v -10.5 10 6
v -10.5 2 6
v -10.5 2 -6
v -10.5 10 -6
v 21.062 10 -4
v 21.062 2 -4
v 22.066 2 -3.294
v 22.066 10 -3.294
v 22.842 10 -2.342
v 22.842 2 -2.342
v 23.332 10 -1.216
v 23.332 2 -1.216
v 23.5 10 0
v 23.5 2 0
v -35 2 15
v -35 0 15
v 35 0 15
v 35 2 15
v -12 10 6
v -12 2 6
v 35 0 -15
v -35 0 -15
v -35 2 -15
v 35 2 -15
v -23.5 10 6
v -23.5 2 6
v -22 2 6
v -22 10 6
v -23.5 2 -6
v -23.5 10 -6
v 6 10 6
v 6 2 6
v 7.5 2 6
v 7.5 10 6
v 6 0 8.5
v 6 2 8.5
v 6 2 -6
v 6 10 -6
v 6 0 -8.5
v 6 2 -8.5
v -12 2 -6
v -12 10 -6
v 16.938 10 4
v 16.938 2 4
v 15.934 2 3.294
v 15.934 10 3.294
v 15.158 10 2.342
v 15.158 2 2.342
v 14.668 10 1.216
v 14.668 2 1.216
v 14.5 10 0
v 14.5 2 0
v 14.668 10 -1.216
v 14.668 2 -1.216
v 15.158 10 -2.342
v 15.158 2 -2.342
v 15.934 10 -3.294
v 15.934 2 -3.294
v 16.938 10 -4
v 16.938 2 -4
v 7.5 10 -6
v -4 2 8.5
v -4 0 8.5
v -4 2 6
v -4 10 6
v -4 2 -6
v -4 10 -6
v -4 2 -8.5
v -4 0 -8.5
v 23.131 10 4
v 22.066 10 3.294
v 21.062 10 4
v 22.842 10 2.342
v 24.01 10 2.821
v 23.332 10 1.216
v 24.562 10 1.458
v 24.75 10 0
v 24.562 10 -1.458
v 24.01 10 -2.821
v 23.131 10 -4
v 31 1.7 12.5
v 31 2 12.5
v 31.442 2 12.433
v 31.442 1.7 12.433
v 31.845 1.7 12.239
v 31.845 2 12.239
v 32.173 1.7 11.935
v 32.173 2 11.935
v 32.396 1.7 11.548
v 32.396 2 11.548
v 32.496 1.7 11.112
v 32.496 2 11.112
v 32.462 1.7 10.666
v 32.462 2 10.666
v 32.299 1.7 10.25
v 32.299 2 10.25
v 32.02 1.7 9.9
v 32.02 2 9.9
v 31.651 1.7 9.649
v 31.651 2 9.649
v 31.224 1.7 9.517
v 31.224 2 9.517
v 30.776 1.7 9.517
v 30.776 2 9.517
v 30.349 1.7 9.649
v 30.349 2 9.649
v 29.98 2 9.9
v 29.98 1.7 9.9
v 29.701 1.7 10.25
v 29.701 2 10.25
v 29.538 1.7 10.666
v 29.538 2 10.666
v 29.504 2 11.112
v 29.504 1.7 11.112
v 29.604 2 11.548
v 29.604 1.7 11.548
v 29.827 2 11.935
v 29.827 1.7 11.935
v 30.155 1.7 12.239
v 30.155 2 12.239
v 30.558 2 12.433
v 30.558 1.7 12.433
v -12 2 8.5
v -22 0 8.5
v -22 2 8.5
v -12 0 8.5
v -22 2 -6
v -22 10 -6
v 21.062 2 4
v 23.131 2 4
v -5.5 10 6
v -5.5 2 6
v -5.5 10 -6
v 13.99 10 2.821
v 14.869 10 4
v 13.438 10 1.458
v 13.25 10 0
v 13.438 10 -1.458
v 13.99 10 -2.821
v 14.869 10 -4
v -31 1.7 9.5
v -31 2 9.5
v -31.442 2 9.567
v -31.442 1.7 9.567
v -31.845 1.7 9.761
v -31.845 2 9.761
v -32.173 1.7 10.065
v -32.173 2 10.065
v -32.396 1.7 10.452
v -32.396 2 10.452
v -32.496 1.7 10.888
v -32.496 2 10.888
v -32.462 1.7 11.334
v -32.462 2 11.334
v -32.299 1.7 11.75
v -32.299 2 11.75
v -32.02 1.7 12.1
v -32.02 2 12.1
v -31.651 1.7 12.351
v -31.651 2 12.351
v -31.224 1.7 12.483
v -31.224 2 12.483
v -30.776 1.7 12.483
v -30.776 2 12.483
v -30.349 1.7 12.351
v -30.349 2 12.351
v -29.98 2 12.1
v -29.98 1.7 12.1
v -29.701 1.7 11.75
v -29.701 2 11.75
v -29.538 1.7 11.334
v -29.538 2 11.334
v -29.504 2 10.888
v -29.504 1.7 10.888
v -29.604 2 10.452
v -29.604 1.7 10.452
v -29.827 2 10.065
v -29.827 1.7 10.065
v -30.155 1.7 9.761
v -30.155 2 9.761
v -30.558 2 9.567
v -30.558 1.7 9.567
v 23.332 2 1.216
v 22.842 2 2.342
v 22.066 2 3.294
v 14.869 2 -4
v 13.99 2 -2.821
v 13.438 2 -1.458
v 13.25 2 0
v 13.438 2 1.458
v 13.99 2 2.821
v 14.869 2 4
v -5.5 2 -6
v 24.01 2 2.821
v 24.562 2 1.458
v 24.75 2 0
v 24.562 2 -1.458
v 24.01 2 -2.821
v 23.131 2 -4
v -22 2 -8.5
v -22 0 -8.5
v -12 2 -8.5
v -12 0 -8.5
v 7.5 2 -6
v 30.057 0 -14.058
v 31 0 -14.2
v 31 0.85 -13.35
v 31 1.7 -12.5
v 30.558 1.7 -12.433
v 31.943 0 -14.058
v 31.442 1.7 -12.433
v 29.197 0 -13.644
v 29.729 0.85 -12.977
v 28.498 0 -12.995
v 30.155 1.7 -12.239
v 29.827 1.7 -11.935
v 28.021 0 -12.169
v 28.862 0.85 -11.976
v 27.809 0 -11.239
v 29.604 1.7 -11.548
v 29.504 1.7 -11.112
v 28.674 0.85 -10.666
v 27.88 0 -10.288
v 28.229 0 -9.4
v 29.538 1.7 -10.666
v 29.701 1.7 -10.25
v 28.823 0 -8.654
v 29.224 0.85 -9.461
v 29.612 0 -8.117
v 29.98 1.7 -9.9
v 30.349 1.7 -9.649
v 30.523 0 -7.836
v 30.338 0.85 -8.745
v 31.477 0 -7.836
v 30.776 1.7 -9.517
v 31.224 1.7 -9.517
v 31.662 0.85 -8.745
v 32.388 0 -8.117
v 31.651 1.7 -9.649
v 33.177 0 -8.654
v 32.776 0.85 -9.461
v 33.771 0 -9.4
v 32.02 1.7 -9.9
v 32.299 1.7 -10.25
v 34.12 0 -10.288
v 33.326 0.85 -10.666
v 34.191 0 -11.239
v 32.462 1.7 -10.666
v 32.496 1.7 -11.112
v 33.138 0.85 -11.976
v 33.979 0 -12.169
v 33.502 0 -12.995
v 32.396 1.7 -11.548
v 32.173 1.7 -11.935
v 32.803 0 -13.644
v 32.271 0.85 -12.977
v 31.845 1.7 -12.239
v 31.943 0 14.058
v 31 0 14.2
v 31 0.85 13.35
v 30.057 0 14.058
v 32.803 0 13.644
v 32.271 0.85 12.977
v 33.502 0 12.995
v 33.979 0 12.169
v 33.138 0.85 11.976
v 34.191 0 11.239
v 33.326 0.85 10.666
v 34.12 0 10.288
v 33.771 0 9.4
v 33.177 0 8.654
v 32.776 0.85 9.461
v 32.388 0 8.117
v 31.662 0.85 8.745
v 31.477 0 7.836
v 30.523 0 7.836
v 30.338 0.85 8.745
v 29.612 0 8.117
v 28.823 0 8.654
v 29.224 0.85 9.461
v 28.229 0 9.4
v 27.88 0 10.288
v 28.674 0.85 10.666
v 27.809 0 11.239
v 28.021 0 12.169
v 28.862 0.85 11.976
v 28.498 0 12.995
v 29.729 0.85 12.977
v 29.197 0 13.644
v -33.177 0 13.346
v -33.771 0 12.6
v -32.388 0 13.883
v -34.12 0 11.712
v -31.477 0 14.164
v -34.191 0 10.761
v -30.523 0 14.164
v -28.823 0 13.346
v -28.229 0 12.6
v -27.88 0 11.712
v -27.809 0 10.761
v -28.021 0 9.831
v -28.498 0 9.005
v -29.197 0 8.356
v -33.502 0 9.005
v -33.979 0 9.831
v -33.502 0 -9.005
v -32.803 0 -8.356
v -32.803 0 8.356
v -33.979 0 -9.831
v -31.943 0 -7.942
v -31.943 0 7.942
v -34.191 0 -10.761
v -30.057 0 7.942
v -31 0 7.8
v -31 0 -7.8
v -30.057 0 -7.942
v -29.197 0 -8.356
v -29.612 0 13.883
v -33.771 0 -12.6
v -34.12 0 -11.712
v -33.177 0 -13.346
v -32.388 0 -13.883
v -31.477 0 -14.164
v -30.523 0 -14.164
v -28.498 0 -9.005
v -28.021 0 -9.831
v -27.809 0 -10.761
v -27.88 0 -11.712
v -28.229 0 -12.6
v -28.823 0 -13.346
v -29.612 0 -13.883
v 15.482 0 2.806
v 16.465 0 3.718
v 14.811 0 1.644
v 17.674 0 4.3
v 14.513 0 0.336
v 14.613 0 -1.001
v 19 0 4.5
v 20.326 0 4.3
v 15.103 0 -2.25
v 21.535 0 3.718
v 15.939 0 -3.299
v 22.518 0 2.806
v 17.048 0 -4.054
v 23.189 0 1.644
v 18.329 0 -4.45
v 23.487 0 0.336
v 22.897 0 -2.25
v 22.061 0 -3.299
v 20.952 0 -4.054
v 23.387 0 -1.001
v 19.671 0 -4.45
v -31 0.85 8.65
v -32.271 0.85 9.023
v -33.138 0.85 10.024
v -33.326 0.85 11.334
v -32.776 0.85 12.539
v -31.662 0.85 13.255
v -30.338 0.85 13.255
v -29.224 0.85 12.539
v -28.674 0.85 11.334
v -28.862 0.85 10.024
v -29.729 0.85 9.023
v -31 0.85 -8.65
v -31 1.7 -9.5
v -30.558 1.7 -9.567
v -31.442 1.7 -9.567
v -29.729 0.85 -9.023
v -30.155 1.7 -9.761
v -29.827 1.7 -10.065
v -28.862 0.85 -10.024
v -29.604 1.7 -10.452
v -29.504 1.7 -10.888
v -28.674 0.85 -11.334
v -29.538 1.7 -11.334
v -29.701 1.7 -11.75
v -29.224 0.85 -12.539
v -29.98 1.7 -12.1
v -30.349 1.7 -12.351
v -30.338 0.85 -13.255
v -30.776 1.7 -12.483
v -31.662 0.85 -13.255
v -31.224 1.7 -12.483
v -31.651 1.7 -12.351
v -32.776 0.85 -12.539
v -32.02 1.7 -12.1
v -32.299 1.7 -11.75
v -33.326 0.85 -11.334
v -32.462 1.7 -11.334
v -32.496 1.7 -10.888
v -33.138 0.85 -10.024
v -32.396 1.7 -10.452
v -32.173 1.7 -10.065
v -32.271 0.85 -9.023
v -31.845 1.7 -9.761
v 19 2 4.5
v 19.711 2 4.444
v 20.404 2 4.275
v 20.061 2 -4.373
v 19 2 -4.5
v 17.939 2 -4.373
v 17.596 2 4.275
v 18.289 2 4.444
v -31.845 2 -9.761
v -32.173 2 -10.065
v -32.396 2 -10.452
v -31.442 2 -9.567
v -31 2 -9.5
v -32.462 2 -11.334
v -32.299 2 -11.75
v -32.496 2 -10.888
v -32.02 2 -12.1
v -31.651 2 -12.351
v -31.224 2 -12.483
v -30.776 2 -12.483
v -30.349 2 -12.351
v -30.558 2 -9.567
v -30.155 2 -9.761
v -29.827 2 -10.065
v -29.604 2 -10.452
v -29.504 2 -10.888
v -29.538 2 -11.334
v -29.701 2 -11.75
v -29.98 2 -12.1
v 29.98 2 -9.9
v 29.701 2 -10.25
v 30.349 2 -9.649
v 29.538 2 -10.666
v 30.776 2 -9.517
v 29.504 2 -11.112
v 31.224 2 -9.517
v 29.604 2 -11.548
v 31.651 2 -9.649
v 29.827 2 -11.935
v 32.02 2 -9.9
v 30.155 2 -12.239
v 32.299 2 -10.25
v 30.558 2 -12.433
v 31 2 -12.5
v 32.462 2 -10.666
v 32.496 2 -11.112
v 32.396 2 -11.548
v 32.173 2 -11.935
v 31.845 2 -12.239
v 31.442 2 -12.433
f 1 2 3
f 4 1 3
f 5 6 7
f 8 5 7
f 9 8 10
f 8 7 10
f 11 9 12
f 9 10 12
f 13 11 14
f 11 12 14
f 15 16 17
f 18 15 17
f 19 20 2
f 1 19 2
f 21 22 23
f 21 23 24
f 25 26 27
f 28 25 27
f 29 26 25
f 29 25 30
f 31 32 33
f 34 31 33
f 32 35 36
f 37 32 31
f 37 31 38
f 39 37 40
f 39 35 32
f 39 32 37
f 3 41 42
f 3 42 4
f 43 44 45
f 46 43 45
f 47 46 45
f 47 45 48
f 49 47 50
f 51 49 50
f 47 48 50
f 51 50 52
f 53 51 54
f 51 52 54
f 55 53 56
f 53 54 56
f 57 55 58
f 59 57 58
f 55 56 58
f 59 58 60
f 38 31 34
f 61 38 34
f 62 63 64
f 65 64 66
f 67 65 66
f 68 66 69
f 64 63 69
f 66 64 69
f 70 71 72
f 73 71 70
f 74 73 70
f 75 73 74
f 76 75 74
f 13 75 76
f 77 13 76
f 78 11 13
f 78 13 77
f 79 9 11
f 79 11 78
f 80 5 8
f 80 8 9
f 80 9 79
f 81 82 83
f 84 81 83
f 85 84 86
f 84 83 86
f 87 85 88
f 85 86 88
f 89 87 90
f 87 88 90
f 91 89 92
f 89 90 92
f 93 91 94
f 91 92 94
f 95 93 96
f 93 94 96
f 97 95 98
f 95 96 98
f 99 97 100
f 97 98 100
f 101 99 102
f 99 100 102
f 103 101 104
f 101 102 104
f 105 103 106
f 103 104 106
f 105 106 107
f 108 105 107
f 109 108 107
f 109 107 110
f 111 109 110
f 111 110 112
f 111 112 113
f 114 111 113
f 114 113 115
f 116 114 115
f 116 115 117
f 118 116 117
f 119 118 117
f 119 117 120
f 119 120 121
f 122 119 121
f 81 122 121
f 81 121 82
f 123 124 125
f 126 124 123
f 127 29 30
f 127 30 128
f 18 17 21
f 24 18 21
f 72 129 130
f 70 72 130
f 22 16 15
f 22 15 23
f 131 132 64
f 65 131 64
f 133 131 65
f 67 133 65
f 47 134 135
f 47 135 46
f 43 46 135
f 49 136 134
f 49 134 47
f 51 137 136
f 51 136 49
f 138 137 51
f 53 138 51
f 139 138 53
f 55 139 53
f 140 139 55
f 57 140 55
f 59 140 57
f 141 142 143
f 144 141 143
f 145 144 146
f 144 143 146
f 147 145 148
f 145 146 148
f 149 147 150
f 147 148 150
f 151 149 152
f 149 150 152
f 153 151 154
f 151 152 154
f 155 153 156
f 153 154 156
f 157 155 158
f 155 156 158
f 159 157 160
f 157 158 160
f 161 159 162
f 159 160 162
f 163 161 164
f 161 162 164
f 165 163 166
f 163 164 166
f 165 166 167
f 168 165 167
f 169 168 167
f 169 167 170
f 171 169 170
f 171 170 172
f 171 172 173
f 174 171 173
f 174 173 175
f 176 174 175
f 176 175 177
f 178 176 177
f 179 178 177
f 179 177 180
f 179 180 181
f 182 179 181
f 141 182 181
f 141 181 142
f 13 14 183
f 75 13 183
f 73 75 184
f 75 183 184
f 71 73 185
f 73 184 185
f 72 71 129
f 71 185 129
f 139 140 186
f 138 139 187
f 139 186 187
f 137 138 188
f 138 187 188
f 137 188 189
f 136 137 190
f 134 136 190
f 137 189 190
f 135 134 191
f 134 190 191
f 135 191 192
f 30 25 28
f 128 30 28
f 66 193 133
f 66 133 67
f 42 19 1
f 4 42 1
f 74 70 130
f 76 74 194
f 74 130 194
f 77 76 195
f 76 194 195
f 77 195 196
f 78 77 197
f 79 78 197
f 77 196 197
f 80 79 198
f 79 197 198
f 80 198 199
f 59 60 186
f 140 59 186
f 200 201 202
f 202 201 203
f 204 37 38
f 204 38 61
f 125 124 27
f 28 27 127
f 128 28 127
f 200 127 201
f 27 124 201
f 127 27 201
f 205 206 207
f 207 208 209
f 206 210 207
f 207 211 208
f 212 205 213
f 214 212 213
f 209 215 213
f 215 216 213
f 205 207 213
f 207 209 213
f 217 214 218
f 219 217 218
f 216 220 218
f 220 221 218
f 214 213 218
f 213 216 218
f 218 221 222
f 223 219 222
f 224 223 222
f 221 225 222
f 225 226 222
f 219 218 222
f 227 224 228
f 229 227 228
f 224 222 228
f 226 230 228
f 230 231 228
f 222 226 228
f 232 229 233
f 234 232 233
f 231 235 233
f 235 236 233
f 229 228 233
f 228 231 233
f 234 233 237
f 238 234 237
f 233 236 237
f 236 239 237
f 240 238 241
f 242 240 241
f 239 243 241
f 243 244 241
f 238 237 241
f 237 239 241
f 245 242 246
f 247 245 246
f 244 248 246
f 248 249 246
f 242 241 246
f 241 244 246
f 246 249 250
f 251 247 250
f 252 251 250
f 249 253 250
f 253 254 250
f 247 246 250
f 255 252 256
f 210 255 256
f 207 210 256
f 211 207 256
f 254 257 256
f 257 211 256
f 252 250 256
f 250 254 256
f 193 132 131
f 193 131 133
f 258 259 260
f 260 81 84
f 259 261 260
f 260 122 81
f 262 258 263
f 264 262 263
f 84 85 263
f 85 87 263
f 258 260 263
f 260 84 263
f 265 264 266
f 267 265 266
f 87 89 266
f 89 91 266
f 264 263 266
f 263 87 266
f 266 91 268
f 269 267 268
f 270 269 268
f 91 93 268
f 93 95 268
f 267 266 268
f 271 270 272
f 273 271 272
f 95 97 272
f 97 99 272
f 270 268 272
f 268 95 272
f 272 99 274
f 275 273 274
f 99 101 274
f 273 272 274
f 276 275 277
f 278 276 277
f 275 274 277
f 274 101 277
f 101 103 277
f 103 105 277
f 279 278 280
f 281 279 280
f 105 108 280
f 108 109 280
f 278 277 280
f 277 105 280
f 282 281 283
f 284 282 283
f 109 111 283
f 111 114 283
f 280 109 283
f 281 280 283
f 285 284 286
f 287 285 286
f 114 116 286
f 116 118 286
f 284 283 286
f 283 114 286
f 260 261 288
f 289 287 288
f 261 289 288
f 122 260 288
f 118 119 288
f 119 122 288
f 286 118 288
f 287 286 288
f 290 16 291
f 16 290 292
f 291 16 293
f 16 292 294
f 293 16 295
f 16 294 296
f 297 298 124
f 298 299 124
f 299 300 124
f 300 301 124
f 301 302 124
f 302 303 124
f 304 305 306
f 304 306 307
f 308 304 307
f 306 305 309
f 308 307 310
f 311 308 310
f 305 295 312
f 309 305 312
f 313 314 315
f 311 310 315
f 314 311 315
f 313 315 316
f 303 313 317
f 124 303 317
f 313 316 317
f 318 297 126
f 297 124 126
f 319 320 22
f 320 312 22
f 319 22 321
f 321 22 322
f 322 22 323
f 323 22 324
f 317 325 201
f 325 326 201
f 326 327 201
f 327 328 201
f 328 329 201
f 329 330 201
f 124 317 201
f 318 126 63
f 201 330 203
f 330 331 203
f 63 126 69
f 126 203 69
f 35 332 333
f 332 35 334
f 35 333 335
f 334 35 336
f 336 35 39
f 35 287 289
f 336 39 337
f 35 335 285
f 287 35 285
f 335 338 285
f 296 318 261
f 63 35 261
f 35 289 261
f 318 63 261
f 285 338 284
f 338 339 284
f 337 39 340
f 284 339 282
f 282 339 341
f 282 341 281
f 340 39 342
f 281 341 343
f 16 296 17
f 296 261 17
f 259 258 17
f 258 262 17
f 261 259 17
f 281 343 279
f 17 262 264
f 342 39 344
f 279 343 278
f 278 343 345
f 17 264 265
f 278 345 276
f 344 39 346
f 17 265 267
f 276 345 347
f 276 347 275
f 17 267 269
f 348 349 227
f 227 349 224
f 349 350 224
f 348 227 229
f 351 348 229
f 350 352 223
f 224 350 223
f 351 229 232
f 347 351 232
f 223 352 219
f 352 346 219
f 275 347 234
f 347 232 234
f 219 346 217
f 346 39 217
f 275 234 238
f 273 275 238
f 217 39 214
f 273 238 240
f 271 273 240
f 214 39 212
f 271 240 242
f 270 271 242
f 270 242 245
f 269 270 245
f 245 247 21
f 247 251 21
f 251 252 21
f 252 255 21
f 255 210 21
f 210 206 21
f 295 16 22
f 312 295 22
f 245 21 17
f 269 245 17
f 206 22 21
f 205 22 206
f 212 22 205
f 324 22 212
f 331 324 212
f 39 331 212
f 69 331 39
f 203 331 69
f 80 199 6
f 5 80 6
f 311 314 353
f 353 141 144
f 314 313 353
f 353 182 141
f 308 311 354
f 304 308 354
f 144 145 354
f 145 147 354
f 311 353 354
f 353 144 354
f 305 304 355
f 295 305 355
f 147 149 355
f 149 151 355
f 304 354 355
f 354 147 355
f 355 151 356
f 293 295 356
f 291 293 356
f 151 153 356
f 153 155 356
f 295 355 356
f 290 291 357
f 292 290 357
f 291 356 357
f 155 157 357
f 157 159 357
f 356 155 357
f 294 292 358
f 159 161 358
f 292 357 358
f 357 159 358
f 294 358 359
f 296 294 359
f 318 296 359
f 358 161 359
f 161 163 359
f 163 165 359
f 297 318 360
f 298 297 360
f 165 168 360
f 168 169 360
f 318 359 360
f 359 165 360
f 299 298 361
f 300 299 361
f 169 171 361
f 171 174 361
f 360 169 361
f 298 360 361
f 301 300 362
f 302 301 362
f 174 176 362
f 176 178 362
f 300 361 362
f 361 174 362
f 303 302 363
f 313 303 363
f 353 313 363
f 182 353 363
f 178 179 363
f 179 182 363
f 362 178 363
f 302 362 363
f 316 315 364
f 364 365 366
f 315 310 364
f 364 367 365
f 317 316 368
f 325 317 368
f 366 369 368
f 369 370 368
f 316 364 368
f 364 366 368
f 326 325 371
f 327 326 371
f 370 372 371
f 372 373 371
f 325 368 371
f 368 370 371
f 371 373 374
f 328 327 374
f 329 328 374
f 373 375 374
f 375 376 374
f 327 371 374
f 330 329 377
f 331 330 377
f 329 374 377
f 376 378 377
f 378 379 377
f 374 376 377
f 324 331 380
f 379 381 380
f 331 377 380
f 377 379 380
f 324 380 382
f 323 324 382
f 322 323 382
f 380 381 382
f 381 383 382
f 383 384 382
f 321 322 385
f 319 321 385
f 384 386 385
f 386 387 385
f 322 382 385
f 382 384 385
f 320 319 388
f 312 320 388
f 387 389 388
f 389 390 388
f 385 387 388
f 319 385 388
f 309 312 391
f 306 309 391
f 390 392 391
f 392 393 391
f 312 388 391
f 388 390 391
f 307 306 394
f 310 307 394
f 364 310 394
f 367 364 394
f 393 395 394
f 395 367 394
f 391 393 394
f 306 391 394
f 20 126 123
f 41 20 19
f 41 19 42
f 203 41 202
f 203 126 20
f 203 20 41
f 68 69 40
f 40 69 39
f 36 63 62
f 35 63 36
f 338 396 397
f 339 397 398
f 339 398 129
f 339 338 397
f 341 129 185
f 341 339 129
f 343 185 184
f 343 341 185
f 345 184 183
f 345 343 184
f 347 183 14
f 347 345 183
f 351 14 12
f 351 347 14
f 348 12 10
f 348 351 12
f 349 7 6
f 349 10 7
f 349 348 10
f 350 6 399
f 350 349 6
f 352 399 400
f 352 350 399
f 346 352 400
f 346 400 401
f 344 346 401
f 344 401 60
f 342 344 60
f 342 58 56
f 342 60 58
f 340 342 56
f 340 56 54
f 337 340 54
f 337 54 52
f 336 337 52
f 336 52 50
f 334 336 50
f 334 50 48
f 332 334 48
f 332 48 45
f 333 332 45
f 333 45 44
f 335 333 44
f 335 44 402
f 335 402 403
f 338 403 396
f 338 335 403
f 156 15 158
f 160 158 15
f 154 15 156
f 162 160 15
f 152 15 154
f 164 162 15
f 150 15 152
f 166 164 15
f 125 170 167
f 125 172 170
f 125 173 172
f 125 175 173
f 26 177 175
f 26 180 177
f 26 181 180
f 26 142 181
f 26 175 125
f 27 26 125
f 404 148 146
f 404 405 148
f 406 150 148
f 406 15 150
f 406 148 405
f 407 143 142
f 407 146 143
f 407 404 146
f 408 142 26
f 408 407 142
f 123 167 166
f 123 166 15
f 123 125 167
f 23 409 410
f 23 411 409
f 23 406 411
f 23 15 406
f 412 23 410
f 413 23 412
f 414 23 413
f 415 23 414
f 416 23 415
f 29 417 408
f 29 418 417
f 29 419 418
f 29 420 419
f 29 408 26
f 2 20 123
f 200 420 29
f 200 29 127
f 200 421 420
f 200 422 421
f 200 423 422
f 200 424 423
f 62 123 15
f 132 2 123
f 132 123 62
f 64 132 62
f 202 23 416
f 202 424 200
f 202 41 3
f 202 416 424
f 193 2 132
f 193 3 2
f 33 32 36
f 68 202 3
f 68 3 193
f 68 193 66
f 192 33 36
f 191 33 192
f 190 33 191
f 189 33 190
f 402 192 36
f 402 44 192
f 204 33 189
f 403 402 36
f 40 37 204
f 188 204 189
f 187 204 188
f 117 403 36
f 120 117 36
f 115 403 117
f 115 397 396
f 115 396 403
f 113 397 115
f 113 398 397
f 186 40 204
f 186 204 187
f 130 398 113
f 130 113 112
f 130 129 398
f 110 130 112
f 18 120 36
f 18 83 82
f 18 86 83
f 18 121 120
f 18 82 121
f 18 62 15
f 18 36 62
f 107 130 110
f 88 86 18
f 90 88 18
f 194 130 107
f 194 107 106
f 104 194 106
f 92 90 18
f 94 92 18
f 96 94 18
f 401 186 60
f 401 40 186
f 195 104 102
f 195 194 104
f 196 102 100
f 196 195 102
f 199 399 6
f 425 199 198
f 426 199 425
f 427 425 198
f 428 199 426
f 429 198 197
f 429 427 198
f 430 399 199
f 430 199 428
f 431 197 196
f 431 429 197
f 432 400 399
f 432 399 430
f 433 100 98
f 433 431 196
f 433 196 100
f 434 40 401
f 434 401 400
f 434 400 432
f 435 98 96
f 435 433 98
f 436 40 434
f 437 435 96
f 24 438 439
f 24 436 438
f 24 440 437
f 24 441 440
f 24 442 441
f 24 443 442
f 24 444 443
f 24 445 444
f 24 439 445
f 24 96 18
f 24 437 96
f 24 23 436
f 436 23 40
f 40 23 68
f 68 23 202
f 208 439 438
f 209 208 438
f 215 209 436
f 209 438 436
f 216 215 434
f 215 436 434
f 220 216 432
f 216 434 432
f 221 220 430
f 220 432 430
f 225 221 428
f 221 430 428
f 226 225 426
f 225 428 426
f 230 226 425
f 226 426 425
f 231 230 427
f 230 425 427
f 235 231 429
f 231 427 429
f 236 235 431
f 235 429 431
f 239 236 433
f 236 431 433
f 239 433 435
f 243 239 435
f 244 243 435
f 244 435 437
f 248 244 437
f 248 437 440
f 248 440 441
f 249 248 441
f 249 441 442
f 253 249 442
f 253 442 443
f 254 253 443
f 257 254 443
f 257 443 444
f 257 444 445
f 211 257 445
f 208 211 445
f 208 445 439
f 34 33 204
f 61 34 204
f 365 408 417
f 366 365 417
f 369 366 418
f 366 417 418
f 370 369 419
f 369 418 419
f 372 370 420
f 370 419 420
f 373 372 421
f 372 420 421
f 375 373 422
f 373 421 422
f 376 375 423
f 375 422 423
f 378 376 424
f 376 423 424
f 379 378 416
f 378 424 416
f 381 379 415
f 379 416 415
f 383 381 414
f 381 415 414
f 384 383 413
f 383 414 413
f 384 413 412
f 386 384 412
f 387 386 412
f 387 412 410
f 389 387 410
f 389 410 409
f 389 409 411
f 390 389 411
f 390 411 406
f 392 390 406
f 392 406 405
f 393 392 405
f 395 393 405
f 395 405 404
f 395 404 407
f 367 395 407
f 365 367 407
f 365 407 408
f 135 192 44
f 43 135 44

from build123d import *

# Parameters (mm, degrees)
SKETCH1_W           = 70
SKETCH1_H           = 30
SKETCH1_R           = 4.5
SKETCH1_W_2         = 10
SKETCH1_H_2         = 17
BOSS_EXTRUDE1_DEPTH = 2
SKETCH2_W           = 1.5
SKETCH2_H           = 12
BOSS_EXTRUDE2_DEPTH = 8
CUT_EXTRUDE1_REACH  = 40.91
SKETCH3_R           = 1.5
CHAMFER1_SIZE       = 1.7


with BuildPart() as part:
    # Sketch1 → Boss-Extrude1 (new body)
    with BuildSketch(Plane(origin=(0, 0, 0), x_dir=(1, 0, 0), z_dir=(0, 1, 0))):
        Rectangle(SKETCH1_W, SKETCH1_H)
        with Locations(Location((19, 0, 0), (0, 0, 270))):
            Circle(SKETCH1_R, mode=Mode.SUBTRACT)
        with Locations((-17, 0)):
            Rectangle(SKETCH1_W_2, SKETCH1_H_2, mode=Mode.SUBTRACT)
        with Locations((1, 0)):
            Rectangle(SKETCH1_W_2, SKETCH1_H_2, mode=Mode.SUBTRACT)
    extrude(amount=BOSS_EXTRUDE1_DEPTH)

    # Sketch2 → Boss-Extrude2 (add)
    with BuildSketch(Plane(origin=(0, 2, 0), x_dir=(1, 0, 0), z_dir=(0, 1, 0))):
        with Locations((-22.75, 0)):
            Rectangle(SKETCH2_W, SKETCH2_H)
        with Locations((-11.25, 0)):
            Rectangle(SKETCH2_W, SKETCH2_H)
        with Locations((-4.75, 0)):
            Rectangle(SKETCH2_W, SKETCH2_H)
        with Locations((6.75, 0)):
            Rectangle(SKETCH2_W, SKETCH2_H)
        with BuildLine():
            Line((16.938447187, 4), (14.86932209, 4))
            ThreePointArc((14.86932209, 4), (13.25, 0), (14.86932209, -4))
            Line((14.86932209, -4), (16.938447187, -4))
            ThreePointArc((16.938447187, -4), (14.5, 0), (16.938447187, 4))
        make_face()
        with BuildLine():
            Line((23.13067791, 4), (21.061552813, 4))
            ThreePointArc((21.061552813, 4), (22.842329219, 2.342329219), (23.5, 0))
            ThreePointArc((23.5, 0), (22.842329219, -2.342329219), (21.061552813, -4))
            Line((21.061552813, -4), (23.13067791, -4))
            ThreePointArc((23.13067791, -4), (24.75, 0), (23.13067791, 4))
        make_face()
    extrude(amount=BOSS_EXTRUDE2_DEPTH)

    # Sketch3 → Cut-Extrude1 (cut, up to next)
    with BuildSketch(Plane(origin=(0, 2, 0), x_dir=(1, 0, 0), z_dir=(0, 1, 0)), mode=Mode.PRIVATE) as cut_extrude1_sk1:
        with Locations(Location((-31, 11, 0), (0, 0, 270))):
            Circle(SKETCH3_R)
    cut_extrude1_tool1 = extrude(cut_extrude1_sk1.sketch, amount=-CUT_EXTRUDE1_REACH, mode=Mode.PRIVATE) & part.part
    # Sketch3 → Cut-Extrude1 (cut, up to next)
    with BuildSketch(Plane(origin=(0, 2, 0), x_dir=(1, 0, 0), z_dir=(0, 1, 0)), mode=Mode.PRIVATE) as cut_extrude1_sk2:
        with Locations(Location((31, 11, 0), (0, 0, 90))):
            Circle(SKETCH3_R)
    cut_extrude1_tool2 = extrude(cut_extrude1_sk2.sketch, amount=-CUT_EXTRUDE1_REACH, mode=Mode.PRIVATE) & part.part
    # Sketch3 → Cut-Extrude1 (cut, up to next)
    with BuildSketch(Plane(origin=(0, 2, 0), x_dir=(1, 0, 0), z_dir=(0, 1, 0)), mode=Mode.PRIVATE) as cut_extrude1_sk3:
        with Locations(Location((31, -11, 0), (0, 0, 270))):
            Circle(SKETCH3_R)
    cut_extrude1_tool3 = extrude(cut_extrude1_sk3.sketch, amount=-CUT_EXTRUDE1_REACH, mode=Mode.PRIVATE) & part.part
    # Sketch3 → Cut-Extrude1 (cut, up to next)
    with BuildSketch(Plane(origin=(0, 2, 0), x_dir=(1, 0, 0), z_dir=(0, 1, 0)), mode=Mode.PRIVATE) as cut_extrude1_sk4:
        with Locations(Location((-31, -11, 0), (0, 0, 90))):
            Circle(SKETCH3_R)
    cut_extrude1_tool4 = extrude(cut_extrude1_sk4.sketch, amount=-CUT_EXTRUDE1_REACH, mode=Mode.PRIVATE) & part.part
    add(cut_extrude1_tool1.solids().sort_by_distance((-31, 2, -11))[0], mode=Mode.SUBTRACT)
    add(cut_extrude1_tool2.solids().sort_by_distance((31, 2, -11))[0], mode=Mode.SUBTRACT)
    add(cut_extrude1_tool3.solids().sort_by_distance((31, 2, 11))[0], mode=Mode.SUBTRACT)
    add(cut_extrude1_tool4.solids().sort_by_distance((-31, 2, 11))[0], mode=Mode.SUBTRACT)

    # Chamfer1
    chamfer1_edges = [part.edges().sort_by_distance(p)[0] for p in [
        (-31, 0, -12.5),
        (31, 0, -9.5),
        (31, 0, 9.5),
        (-31, 0, 12.5),
    ]]
    chamfer(chamfer1_edges, length=CHAMFER1_SIZE)


solid = part.part
